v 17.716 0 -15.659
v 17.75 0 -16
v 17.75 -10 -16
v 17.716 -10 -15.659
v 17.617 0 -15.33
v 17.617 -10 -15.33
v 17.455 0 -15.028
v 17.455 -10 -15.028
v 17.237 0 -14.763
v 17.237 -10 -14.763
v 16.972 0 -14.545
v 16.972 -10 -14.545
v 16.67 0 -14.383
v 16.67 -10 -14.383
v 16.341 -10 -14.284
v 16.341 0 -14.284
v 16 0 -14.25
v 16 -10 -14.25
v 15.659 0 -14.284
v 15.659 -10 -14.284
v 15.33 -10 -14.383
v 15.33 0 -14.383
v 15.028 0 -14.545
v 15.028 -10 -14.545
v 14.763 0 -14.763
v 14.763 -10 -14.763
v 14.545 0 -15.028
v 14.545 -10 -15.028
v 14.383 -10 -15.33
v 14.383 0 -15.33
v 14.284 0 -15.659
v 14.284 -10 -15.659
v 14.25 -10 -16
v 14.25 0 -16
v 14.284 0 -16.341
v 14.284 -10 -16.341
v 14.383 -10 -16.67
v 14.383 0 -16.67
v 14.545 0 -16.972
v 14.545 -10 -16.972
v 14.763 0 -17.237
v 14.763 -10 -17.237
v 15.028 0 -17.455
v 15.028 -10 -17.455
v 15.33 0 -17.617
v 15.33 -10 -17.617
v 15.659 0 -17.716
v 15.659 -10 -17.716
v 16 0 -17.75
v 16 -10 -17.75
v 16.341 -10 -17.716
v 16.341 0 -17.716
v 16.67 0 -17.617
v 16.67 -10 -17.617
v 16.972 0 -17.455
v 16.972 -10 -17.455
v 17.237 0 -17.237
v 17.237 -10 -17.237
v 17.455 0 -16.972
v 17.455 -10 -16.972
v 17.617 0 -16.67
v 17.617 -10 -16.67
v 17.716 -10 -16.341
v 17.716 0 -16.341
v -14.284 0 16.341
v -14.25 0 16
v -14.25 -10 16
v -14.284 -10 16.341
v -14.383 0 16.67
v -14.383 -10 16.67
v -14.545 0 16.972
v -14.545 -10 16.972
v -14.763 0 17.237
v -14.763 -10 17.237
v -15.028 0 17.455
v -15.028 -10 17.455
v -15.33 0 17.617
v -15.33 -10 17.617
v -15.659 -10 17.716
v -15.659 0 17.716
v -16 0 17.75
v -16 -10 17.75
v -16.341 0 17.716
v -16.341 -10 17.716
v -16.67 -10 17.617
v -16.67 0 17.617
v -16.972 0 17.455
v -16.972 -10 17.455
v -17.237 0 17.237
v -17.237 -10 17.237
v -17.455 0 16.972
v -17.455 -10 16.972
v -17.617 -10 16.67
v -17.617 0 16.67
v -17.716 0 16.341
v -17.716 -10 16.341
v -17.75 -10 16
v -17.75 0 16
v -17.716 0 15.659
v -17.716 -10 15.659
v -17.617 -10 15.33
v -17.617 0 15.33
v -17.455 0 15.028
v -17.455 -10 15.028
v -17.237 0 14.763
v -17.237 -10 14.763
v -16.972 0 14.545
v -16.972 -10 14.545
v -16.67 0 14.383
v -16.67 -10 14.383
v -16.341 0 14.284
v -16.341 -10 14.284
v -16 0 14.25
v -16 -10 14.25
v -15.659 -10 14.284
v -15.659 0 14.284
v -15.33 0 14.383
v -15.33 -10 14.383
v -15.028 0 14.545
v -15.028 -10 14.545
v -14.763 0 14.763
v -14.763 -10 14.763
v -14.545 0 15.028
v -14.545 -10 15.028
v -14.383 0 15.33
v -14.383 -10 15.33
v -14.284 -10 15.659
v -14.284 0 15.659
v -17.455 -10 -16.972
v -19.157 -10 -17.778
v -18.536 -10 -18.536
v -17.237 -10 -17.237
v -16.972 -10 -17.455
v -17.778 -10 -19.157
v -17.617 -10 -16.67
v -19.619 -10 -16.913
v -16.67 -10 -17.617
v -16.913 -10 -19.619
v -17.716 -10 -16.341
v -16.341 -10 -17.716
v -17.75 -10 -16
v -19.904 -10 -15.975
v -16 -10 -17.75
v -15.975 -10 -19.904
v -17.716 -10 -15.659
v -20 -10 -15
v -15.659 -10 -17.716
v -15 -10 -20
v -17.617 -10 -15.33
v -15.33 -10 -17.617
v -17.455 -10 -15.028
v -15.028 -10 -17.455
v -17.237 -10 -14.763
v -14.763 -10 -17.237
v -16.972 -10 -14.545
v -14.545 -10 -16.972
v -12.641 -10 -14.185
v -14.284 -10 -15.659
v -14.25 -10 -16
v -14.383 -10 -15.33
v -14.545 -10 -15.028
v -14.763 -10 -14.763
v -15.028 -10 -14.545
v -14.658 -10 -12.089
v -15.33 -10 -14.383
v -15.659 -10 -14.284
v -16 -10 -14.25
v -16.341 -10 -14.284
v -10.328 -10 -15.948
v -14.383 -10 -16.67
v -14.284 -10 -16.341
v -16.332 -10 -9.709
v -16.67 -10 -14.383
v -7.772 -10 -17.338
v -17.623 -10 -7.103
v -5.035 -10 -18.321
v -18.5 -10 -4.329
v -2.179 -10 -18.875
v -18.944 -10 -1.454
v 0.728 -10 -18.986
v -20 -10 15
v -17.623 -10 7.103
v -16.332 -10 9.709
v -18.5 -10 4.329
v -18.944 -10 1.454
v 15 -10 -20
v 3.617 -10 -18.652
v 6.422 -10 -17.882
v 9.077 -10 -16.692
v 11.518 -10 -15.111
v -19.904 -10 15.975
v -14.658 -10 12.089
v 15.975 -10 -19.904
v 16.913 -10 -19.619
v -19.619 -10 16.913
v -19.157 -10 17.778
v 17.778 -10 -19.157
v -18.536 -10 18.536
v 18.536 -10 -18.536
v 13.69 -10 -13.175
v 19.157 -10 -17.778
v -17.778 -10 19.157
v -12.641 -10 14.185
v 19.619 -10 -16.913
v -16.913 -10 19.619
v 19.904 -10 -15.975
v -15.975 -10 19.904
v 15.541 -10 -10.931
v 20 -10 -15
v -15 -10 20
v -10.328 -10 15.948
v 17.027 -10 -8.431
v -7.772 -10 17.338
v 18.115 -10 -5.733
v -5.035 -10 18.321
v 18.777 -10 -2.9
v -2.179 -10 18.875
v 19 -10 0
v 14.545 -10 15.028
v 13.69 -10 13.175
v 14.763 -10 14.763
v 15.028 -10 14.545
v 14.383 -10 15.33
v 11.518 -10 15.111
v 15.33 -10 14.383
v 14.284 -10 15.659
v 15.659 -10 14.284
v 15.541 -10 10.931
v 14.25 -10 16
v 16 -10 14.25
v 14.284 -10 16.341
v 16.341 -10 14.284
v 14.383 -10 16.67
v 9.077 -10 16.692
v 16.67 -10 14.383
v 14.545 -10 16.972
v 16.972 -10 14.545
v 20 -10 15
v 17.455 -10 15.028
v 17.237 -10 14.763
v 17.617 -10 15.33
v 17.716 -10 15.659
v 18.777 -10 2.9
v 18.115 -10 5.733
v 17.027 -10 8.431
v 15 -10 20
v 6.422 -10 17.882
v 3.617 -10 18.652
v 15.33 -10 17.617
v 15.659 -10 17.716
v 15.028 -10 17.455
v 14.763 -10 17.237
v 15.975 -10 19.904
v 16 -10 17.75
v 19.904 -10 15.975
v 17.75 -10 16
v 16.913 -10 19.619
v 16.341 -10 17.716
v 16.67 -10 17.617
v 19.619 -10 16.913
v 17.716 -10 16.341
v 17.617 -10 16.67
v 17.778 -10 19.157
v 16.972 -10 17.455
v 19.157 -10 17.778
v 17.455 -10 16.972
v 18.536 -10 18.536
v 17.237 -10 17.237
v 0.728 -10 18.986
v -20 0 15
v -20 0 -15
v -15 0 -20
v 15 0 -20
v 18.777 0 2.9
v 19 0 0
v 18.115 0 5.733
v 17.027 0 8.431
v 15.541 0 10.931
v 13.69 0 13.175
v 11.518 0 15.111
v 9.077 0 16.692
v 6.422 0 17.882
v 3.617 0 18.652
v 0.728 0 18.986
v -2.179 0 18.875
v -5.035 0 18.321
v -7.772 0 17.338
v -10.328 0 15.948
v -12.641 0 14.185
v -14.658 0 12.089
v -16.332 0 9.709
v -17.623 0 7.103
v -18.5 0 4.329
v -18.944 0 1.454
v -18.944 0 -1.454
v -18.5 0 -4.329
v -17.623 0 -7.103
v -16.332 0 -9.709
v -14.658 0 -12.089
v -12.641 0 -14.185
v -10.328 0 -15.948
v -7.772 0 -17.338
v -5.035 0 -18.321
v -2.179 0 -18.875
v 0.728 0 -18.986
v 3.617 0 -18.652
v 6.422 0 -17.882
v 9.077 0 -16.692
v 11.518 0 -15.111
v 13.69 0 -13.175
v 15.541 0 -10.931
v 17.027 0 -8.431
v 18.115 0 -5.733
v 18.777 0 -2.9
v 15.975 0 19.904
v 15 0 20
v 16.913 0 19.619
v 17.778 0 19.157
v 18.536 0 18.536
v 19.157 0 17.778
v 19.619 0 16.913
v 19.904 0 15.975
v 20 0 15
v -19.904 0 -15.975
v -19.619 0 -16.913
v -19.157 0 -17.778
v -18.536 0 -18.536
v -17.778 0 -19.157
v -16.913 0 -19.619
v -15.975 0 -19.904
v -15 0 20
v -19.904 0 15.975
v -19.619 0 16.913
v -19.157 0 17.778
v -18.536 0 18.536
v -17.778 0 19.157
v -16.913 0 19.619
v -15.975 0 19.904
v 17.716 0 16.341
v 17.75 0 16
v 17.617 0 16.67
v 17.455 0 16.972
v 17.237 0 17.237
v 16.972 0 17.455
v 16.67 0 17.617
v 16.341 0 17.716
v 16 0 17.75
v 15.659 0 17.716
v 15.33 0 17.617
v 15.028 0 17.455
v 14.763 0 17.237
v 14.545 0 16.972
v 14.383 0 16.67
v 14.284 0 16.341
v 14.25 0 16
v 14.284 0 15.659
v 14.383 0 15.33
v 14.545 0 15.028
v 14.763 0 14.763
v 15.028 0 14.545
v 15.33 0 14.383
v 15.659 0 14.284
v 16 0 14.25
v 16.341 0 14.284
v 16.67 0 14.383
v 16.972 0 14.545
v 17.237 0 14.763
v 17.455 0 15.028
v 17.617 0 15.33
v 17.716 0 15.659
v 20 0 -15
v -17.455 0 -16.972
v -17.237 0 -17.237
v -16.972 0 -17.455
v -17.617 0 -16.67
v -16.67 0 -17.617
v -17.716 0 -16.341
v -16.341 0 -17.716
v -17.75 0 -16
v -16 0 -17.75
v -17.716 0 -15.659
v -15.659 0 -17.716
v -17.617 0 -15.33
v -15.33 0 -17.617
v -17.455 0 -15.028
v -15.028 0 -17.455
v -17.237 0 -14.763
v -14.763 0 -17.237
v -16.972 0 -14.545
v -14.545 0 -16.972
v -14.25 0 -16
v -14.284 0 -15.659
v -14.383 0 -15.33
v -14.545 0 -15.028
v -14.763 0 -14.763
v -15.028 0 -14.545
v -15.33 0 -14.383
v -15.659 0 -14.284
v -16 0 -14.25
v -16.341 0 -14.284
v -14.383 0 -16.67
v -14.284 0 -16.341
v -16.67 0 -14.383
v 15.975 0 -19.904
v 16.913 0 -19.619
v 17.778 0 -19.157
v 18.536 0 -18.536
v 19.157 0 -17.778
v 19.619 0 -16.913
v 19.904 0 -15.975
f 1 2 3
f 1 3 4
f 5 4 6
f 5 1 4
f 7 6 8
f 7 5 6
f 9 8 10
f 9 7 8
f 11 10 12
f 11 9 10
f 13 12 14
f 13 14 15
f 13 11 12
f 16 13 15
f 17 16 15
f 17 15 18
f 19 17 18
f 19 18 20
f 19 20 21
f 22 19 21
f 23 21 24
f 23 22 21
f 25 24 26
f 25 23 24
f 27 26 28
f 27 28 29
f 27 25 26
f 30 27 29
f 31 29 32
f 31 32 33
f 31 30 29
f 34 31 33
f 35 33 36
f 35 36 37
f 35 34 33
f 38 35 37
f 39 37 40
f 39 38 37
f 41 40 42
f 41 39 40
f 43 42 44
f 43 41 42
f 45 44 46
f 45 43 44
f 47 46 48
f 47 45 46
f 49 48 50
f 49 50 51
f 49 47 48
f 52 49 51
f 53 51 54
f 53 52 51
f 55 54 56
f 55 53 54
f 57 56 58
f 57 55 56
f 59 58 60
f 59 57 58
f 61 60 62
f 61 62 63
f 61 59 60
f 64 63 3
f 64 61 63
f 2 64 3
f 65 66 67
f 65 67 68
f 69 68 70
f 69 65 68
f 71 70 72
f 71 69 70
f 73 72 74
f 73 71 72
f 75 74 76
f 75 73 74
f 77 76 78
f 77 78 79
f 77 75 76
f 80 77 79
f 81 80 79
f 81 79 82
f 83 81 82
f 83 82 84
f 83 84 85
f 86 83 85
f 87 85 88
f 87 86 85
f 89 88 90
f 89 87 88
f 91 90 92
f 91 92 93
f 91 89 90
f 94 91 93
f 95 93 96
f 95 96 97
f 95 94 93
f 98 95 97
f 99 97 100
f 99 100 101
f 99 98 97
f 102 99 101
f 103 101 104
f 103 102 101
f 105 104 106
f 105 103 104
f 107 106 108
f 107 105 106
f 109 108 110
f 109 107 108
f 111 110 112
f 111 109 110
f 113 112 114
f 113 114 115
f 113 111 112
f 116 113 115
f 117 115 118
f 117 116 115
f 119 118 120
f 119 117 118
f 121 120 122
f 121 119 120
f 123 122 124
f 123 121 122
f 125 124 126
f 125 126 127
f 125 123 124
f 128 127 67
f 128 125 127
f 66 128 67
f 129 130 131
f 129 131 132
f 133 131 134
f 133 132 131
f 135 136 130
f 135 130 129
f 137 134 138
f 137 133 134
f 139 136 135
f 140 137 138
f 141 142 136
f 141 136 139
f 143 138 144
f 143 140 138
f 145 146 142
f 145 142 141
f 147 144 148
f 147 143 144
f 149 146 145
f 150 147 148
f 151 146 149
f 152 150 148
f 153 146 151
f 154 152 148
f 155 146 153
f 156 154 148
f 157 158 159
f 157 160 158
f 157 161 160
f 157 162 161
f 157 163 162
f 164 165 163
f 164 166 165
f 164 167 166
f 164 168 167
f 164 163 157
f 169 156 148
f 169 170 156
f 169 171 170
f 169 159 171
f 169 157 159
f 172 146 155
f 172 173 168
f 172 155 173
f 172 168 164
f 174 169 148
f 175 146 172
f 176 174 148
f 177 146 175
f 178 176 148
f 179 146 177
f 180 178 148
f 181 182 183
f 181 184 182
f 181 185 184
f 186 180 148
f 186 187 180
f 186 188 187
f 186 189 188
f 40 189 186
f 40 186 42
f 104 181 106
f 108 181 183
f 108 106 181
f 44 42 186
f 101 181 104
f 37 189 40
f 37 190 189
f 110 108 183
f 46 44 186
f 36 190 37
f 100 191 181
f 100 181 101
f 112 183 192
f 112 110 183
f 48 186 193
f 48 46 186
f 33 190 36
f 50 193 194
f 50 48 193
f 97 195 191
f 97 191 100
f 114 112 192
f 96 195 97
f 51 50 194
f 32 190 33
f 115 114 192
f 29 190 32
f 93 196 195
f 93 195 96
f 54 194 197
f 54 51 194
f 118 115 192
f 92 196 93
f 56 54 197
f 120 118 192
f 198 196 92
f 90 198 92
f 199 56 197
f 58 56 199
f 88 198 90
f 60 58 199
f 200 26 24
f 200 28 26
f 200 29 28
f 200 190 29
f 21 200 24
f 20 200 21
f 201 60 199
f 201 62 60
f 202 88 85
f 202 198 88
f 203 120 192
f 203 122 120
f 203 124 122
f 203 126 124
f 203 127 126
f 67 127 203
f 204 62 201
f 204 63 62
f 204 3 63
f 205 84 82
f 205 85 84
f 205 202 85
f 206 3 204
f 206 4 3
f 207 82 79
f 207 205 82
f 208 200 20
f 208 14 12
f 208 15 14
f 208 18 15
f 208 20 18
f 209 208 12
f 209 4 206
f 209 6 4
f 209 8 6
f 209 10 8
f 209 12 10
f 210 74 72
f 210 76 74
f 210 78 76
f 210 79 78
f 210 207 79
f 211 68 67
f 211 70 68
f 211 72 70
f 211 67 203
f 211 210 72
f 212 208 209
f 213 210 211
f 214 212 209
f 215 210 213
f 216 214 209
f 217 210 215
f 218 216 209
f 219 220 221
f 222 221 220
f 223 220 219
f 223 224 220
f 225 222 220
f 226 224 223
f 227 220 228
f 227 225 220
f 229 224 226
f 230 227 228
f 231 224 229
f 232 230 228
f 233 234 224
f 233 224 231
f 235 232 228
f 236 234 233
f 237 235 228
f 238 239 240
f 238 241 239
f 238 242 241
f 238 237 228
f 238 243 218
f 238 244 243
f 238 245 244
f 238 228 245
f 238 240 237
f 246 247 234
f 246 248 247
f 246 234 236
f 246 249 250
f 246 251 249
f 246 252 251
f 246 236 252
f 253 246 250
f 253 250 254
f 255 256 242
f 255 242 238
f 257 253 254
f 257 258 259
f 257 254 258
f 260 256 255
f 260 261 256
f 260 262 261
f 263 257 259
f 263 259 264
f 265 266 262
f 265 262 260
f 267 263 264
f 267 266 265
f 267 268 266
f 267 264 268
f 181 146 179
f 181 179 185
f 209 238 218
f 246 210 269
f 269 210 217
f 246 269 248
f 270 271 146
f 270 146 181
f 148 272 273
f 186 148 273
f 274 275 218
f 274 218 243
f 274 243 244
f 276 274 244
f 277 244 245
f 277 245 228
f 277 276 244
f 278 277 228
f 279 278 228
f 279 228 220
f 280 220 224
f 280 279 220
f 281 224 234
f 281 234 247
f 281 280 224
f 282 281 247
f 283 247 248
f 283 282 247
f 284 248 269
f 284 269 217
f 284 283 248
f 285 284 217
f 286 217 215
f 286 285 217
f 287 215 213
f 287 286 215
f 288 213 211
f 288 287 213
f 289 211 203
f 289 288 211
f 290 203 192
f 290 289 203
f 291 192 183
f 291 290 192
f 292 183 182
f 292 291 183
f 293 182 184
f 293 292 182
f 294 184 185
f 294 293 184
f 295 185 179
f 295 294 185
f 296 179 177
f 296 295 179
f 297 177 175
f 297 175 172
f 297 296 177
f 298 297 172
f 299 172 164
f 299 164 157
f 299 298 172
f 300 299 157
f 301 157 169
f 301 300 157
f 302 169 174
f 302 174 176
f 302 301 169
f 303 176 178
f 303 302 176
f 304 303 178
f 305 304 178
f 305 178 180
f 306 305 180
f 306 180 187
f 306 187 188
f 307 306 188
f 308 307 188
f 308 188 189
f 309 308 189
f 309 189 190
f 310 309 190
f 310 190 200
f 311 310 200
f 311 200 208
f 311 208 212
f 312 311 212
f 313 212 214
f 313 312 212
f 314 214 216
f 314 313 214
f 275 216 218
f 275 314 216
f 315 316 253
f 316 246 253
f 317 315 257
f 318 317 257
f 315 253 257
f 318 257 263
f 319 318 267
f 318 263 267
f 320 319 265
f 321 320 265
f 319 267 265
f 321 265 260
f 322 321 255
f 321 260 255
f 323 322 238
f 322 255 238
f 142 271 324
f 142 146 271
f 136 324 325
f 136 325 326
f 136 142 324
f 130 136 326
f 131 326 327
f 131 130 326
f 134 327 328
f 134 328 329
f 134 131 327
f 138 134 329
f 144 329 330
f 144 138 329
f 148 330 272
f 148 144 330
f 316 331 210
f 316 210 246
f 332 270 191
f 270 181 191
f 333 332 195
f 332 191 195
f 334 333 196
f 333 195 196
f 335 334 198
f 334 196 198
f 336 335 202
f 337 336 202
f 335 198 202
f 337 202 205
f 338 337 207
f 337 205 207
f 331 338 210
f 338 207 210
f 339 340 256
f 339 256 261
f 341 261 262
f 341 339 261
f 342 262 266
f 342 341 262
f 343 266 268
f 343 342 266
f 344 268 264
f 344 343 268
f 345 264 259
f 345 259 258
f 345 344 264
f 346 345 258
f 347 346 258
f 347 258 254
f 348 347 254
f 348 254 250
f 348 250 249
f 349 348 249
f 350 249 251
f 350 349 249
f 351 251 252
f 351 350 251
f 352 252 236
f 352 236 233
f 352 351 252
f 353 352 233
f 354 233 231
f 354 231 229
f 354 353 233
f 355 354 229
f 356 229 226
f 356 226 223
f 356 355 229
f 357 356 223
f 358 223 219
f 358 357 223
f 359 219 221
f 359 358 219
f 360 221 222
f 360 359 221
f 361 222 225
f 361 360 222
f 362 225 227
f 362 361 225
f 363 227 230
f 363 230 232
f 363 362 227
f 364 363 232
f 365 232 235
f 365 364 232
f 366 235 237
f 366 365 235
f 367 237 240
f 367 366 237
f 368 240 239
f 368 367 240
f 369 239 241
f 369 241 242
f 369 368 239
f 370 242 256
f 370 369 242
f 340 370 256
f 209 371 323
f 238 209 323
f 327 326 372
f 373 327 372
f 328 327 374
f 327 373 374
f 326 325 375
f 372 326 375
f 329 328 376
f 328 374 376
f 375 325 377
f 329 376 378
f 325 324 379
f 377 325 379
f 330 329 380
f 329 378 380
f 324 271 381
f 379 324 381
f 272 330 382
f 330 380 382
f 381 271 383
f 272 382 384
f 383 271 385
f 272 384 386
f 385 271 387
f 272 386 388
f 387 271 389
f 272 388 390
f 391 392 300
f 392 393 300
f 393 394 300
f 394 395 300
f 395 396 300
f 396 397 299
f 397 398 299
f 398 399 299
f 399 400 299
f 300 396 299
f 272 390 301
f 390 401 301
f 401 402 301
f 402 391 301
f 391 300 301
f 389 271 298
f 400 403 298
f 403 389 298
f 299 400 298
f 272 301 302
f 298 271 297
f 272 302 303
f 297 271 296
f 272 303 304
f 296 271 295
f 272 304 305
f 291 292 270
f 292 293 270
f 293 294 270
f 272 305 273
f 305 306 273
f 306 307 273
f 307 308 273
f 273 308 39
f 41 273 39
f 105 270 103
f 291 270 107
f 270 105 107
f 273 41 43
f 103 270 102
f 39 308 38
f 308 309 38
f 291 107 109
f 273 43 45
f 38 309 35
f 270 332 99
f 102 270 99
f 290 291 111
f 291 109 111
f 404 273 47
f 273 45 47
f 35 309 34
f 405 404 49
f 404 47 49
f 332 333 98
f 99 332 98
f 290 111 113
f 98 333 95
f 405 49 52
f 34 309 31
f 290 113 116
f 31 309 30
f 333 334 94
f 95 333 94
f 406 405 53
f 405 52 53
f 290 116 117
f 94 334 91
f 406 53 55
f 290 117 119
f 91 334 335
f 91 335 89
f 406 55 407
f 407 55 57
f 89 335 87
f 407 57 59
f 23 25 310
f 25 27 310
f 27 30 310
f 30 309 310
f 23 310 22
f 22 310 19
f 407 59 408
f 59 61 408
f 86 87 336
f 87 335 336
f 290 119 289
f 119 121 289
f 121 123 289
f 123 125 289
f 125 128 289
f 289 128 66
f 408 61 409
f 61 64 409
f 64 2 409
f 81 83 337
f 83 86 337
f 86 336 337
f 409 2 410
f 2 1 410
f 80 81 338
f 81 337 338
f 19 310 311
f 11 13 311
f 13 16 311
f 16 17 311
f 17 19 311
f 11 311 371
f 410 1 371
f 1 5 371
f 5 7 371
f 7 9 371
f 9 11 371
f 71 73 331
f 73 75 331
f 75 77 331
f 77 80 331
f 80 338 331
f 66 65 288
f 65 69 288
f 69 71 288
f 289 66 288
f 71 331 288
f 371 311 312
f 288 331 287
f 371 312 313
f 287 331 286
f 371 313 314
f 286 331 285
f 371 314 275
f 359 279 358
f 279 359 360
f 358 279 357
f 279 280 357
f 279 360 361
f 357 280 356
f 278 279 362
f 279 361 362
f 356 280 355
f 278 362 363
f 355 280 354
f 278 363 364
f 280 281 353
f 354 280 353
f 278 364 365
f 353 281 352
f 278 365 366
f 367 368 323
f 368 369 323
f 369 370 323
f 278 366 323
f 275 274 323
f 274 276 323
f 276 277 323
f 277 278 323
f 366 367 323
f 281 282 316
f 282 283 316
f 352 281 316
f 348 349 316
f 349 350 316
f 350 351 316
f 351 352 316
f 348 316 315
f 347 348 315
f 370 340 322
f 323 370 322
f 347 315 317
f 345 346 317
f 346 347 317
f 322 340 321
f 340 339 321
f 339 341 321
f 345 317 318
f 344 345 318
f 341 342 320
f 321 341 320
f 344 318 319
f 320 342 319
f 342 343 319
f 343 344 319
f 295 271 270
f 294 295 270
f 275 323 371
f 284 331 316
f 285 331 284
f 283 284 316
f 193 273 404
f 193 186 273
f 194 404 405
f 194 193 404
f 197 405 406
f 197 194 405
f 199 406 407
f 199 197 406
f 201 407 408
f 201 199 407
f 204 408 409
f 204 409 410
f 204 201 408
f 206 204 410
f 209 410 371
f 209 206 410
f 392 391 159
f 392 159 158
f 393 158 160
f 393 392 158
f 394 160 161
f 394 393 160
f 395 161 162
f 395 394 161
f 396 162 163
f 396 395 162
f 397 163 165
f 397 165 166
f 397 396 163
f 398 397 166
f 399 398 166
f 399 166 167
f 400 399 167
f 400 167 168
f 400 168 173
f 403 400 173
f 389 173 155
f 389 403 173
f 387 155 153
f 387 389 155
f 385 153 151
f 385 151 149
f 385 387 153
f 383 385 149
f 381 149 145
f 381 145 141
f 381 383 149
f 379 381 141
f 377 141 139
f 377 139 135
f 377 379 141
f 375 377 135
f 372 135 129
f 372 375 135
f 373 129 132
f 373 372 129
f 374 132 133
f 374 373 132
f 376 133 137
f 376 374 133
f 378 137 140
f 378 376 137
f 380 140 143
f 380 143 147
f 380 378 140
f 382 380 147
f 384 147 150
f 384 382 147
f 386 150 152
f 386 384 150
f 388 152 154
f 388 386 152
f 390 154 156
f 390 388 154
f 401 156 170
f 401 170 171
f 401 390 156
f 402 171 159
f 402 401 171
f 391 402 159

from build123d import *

# Parameters (mm, degrees)
F0_W     = 40
F0_H     = 40
F0_R     = 1.75
F0_R_2   = 19
F1_DEPTH = 10
F2_R     = 5


with BuildPart() as f1:
    # F0 (on Front) → F1 (new body)
    with BuildSketch(Plane.XZ):
        Rectangle(F0_W, F0_H)
        with Locations((-16, -16)):
            Circle(F0_R, mode=Mode.SUBTRACT)
        with Locations((16, -16)):
            Circle(F0_R, mode=Mode.SUBTRACT)
        with Locations((-16, 16)):
            Circle(F0_R, mode=Mode.SUBTRACT)
        Circle(F0_R_2, mode=Mode.SUBTRACT)
        with Locations((16, 16)):
            Circle(F0_R, mode=Mode.SUBTRACT)
    extrude(amount=F1_DEPTH)

    # F2
    f2_edges = [f1.edges().sort_by_distance(p)[0] for p in [
        (-20, -5, 20),
        (20, -5, 20),
        (20, -5, -20),
        (-20, -5, -20),
    ]]
    fillet(f2_edges, radius=F2_R)


solid = f1.part
